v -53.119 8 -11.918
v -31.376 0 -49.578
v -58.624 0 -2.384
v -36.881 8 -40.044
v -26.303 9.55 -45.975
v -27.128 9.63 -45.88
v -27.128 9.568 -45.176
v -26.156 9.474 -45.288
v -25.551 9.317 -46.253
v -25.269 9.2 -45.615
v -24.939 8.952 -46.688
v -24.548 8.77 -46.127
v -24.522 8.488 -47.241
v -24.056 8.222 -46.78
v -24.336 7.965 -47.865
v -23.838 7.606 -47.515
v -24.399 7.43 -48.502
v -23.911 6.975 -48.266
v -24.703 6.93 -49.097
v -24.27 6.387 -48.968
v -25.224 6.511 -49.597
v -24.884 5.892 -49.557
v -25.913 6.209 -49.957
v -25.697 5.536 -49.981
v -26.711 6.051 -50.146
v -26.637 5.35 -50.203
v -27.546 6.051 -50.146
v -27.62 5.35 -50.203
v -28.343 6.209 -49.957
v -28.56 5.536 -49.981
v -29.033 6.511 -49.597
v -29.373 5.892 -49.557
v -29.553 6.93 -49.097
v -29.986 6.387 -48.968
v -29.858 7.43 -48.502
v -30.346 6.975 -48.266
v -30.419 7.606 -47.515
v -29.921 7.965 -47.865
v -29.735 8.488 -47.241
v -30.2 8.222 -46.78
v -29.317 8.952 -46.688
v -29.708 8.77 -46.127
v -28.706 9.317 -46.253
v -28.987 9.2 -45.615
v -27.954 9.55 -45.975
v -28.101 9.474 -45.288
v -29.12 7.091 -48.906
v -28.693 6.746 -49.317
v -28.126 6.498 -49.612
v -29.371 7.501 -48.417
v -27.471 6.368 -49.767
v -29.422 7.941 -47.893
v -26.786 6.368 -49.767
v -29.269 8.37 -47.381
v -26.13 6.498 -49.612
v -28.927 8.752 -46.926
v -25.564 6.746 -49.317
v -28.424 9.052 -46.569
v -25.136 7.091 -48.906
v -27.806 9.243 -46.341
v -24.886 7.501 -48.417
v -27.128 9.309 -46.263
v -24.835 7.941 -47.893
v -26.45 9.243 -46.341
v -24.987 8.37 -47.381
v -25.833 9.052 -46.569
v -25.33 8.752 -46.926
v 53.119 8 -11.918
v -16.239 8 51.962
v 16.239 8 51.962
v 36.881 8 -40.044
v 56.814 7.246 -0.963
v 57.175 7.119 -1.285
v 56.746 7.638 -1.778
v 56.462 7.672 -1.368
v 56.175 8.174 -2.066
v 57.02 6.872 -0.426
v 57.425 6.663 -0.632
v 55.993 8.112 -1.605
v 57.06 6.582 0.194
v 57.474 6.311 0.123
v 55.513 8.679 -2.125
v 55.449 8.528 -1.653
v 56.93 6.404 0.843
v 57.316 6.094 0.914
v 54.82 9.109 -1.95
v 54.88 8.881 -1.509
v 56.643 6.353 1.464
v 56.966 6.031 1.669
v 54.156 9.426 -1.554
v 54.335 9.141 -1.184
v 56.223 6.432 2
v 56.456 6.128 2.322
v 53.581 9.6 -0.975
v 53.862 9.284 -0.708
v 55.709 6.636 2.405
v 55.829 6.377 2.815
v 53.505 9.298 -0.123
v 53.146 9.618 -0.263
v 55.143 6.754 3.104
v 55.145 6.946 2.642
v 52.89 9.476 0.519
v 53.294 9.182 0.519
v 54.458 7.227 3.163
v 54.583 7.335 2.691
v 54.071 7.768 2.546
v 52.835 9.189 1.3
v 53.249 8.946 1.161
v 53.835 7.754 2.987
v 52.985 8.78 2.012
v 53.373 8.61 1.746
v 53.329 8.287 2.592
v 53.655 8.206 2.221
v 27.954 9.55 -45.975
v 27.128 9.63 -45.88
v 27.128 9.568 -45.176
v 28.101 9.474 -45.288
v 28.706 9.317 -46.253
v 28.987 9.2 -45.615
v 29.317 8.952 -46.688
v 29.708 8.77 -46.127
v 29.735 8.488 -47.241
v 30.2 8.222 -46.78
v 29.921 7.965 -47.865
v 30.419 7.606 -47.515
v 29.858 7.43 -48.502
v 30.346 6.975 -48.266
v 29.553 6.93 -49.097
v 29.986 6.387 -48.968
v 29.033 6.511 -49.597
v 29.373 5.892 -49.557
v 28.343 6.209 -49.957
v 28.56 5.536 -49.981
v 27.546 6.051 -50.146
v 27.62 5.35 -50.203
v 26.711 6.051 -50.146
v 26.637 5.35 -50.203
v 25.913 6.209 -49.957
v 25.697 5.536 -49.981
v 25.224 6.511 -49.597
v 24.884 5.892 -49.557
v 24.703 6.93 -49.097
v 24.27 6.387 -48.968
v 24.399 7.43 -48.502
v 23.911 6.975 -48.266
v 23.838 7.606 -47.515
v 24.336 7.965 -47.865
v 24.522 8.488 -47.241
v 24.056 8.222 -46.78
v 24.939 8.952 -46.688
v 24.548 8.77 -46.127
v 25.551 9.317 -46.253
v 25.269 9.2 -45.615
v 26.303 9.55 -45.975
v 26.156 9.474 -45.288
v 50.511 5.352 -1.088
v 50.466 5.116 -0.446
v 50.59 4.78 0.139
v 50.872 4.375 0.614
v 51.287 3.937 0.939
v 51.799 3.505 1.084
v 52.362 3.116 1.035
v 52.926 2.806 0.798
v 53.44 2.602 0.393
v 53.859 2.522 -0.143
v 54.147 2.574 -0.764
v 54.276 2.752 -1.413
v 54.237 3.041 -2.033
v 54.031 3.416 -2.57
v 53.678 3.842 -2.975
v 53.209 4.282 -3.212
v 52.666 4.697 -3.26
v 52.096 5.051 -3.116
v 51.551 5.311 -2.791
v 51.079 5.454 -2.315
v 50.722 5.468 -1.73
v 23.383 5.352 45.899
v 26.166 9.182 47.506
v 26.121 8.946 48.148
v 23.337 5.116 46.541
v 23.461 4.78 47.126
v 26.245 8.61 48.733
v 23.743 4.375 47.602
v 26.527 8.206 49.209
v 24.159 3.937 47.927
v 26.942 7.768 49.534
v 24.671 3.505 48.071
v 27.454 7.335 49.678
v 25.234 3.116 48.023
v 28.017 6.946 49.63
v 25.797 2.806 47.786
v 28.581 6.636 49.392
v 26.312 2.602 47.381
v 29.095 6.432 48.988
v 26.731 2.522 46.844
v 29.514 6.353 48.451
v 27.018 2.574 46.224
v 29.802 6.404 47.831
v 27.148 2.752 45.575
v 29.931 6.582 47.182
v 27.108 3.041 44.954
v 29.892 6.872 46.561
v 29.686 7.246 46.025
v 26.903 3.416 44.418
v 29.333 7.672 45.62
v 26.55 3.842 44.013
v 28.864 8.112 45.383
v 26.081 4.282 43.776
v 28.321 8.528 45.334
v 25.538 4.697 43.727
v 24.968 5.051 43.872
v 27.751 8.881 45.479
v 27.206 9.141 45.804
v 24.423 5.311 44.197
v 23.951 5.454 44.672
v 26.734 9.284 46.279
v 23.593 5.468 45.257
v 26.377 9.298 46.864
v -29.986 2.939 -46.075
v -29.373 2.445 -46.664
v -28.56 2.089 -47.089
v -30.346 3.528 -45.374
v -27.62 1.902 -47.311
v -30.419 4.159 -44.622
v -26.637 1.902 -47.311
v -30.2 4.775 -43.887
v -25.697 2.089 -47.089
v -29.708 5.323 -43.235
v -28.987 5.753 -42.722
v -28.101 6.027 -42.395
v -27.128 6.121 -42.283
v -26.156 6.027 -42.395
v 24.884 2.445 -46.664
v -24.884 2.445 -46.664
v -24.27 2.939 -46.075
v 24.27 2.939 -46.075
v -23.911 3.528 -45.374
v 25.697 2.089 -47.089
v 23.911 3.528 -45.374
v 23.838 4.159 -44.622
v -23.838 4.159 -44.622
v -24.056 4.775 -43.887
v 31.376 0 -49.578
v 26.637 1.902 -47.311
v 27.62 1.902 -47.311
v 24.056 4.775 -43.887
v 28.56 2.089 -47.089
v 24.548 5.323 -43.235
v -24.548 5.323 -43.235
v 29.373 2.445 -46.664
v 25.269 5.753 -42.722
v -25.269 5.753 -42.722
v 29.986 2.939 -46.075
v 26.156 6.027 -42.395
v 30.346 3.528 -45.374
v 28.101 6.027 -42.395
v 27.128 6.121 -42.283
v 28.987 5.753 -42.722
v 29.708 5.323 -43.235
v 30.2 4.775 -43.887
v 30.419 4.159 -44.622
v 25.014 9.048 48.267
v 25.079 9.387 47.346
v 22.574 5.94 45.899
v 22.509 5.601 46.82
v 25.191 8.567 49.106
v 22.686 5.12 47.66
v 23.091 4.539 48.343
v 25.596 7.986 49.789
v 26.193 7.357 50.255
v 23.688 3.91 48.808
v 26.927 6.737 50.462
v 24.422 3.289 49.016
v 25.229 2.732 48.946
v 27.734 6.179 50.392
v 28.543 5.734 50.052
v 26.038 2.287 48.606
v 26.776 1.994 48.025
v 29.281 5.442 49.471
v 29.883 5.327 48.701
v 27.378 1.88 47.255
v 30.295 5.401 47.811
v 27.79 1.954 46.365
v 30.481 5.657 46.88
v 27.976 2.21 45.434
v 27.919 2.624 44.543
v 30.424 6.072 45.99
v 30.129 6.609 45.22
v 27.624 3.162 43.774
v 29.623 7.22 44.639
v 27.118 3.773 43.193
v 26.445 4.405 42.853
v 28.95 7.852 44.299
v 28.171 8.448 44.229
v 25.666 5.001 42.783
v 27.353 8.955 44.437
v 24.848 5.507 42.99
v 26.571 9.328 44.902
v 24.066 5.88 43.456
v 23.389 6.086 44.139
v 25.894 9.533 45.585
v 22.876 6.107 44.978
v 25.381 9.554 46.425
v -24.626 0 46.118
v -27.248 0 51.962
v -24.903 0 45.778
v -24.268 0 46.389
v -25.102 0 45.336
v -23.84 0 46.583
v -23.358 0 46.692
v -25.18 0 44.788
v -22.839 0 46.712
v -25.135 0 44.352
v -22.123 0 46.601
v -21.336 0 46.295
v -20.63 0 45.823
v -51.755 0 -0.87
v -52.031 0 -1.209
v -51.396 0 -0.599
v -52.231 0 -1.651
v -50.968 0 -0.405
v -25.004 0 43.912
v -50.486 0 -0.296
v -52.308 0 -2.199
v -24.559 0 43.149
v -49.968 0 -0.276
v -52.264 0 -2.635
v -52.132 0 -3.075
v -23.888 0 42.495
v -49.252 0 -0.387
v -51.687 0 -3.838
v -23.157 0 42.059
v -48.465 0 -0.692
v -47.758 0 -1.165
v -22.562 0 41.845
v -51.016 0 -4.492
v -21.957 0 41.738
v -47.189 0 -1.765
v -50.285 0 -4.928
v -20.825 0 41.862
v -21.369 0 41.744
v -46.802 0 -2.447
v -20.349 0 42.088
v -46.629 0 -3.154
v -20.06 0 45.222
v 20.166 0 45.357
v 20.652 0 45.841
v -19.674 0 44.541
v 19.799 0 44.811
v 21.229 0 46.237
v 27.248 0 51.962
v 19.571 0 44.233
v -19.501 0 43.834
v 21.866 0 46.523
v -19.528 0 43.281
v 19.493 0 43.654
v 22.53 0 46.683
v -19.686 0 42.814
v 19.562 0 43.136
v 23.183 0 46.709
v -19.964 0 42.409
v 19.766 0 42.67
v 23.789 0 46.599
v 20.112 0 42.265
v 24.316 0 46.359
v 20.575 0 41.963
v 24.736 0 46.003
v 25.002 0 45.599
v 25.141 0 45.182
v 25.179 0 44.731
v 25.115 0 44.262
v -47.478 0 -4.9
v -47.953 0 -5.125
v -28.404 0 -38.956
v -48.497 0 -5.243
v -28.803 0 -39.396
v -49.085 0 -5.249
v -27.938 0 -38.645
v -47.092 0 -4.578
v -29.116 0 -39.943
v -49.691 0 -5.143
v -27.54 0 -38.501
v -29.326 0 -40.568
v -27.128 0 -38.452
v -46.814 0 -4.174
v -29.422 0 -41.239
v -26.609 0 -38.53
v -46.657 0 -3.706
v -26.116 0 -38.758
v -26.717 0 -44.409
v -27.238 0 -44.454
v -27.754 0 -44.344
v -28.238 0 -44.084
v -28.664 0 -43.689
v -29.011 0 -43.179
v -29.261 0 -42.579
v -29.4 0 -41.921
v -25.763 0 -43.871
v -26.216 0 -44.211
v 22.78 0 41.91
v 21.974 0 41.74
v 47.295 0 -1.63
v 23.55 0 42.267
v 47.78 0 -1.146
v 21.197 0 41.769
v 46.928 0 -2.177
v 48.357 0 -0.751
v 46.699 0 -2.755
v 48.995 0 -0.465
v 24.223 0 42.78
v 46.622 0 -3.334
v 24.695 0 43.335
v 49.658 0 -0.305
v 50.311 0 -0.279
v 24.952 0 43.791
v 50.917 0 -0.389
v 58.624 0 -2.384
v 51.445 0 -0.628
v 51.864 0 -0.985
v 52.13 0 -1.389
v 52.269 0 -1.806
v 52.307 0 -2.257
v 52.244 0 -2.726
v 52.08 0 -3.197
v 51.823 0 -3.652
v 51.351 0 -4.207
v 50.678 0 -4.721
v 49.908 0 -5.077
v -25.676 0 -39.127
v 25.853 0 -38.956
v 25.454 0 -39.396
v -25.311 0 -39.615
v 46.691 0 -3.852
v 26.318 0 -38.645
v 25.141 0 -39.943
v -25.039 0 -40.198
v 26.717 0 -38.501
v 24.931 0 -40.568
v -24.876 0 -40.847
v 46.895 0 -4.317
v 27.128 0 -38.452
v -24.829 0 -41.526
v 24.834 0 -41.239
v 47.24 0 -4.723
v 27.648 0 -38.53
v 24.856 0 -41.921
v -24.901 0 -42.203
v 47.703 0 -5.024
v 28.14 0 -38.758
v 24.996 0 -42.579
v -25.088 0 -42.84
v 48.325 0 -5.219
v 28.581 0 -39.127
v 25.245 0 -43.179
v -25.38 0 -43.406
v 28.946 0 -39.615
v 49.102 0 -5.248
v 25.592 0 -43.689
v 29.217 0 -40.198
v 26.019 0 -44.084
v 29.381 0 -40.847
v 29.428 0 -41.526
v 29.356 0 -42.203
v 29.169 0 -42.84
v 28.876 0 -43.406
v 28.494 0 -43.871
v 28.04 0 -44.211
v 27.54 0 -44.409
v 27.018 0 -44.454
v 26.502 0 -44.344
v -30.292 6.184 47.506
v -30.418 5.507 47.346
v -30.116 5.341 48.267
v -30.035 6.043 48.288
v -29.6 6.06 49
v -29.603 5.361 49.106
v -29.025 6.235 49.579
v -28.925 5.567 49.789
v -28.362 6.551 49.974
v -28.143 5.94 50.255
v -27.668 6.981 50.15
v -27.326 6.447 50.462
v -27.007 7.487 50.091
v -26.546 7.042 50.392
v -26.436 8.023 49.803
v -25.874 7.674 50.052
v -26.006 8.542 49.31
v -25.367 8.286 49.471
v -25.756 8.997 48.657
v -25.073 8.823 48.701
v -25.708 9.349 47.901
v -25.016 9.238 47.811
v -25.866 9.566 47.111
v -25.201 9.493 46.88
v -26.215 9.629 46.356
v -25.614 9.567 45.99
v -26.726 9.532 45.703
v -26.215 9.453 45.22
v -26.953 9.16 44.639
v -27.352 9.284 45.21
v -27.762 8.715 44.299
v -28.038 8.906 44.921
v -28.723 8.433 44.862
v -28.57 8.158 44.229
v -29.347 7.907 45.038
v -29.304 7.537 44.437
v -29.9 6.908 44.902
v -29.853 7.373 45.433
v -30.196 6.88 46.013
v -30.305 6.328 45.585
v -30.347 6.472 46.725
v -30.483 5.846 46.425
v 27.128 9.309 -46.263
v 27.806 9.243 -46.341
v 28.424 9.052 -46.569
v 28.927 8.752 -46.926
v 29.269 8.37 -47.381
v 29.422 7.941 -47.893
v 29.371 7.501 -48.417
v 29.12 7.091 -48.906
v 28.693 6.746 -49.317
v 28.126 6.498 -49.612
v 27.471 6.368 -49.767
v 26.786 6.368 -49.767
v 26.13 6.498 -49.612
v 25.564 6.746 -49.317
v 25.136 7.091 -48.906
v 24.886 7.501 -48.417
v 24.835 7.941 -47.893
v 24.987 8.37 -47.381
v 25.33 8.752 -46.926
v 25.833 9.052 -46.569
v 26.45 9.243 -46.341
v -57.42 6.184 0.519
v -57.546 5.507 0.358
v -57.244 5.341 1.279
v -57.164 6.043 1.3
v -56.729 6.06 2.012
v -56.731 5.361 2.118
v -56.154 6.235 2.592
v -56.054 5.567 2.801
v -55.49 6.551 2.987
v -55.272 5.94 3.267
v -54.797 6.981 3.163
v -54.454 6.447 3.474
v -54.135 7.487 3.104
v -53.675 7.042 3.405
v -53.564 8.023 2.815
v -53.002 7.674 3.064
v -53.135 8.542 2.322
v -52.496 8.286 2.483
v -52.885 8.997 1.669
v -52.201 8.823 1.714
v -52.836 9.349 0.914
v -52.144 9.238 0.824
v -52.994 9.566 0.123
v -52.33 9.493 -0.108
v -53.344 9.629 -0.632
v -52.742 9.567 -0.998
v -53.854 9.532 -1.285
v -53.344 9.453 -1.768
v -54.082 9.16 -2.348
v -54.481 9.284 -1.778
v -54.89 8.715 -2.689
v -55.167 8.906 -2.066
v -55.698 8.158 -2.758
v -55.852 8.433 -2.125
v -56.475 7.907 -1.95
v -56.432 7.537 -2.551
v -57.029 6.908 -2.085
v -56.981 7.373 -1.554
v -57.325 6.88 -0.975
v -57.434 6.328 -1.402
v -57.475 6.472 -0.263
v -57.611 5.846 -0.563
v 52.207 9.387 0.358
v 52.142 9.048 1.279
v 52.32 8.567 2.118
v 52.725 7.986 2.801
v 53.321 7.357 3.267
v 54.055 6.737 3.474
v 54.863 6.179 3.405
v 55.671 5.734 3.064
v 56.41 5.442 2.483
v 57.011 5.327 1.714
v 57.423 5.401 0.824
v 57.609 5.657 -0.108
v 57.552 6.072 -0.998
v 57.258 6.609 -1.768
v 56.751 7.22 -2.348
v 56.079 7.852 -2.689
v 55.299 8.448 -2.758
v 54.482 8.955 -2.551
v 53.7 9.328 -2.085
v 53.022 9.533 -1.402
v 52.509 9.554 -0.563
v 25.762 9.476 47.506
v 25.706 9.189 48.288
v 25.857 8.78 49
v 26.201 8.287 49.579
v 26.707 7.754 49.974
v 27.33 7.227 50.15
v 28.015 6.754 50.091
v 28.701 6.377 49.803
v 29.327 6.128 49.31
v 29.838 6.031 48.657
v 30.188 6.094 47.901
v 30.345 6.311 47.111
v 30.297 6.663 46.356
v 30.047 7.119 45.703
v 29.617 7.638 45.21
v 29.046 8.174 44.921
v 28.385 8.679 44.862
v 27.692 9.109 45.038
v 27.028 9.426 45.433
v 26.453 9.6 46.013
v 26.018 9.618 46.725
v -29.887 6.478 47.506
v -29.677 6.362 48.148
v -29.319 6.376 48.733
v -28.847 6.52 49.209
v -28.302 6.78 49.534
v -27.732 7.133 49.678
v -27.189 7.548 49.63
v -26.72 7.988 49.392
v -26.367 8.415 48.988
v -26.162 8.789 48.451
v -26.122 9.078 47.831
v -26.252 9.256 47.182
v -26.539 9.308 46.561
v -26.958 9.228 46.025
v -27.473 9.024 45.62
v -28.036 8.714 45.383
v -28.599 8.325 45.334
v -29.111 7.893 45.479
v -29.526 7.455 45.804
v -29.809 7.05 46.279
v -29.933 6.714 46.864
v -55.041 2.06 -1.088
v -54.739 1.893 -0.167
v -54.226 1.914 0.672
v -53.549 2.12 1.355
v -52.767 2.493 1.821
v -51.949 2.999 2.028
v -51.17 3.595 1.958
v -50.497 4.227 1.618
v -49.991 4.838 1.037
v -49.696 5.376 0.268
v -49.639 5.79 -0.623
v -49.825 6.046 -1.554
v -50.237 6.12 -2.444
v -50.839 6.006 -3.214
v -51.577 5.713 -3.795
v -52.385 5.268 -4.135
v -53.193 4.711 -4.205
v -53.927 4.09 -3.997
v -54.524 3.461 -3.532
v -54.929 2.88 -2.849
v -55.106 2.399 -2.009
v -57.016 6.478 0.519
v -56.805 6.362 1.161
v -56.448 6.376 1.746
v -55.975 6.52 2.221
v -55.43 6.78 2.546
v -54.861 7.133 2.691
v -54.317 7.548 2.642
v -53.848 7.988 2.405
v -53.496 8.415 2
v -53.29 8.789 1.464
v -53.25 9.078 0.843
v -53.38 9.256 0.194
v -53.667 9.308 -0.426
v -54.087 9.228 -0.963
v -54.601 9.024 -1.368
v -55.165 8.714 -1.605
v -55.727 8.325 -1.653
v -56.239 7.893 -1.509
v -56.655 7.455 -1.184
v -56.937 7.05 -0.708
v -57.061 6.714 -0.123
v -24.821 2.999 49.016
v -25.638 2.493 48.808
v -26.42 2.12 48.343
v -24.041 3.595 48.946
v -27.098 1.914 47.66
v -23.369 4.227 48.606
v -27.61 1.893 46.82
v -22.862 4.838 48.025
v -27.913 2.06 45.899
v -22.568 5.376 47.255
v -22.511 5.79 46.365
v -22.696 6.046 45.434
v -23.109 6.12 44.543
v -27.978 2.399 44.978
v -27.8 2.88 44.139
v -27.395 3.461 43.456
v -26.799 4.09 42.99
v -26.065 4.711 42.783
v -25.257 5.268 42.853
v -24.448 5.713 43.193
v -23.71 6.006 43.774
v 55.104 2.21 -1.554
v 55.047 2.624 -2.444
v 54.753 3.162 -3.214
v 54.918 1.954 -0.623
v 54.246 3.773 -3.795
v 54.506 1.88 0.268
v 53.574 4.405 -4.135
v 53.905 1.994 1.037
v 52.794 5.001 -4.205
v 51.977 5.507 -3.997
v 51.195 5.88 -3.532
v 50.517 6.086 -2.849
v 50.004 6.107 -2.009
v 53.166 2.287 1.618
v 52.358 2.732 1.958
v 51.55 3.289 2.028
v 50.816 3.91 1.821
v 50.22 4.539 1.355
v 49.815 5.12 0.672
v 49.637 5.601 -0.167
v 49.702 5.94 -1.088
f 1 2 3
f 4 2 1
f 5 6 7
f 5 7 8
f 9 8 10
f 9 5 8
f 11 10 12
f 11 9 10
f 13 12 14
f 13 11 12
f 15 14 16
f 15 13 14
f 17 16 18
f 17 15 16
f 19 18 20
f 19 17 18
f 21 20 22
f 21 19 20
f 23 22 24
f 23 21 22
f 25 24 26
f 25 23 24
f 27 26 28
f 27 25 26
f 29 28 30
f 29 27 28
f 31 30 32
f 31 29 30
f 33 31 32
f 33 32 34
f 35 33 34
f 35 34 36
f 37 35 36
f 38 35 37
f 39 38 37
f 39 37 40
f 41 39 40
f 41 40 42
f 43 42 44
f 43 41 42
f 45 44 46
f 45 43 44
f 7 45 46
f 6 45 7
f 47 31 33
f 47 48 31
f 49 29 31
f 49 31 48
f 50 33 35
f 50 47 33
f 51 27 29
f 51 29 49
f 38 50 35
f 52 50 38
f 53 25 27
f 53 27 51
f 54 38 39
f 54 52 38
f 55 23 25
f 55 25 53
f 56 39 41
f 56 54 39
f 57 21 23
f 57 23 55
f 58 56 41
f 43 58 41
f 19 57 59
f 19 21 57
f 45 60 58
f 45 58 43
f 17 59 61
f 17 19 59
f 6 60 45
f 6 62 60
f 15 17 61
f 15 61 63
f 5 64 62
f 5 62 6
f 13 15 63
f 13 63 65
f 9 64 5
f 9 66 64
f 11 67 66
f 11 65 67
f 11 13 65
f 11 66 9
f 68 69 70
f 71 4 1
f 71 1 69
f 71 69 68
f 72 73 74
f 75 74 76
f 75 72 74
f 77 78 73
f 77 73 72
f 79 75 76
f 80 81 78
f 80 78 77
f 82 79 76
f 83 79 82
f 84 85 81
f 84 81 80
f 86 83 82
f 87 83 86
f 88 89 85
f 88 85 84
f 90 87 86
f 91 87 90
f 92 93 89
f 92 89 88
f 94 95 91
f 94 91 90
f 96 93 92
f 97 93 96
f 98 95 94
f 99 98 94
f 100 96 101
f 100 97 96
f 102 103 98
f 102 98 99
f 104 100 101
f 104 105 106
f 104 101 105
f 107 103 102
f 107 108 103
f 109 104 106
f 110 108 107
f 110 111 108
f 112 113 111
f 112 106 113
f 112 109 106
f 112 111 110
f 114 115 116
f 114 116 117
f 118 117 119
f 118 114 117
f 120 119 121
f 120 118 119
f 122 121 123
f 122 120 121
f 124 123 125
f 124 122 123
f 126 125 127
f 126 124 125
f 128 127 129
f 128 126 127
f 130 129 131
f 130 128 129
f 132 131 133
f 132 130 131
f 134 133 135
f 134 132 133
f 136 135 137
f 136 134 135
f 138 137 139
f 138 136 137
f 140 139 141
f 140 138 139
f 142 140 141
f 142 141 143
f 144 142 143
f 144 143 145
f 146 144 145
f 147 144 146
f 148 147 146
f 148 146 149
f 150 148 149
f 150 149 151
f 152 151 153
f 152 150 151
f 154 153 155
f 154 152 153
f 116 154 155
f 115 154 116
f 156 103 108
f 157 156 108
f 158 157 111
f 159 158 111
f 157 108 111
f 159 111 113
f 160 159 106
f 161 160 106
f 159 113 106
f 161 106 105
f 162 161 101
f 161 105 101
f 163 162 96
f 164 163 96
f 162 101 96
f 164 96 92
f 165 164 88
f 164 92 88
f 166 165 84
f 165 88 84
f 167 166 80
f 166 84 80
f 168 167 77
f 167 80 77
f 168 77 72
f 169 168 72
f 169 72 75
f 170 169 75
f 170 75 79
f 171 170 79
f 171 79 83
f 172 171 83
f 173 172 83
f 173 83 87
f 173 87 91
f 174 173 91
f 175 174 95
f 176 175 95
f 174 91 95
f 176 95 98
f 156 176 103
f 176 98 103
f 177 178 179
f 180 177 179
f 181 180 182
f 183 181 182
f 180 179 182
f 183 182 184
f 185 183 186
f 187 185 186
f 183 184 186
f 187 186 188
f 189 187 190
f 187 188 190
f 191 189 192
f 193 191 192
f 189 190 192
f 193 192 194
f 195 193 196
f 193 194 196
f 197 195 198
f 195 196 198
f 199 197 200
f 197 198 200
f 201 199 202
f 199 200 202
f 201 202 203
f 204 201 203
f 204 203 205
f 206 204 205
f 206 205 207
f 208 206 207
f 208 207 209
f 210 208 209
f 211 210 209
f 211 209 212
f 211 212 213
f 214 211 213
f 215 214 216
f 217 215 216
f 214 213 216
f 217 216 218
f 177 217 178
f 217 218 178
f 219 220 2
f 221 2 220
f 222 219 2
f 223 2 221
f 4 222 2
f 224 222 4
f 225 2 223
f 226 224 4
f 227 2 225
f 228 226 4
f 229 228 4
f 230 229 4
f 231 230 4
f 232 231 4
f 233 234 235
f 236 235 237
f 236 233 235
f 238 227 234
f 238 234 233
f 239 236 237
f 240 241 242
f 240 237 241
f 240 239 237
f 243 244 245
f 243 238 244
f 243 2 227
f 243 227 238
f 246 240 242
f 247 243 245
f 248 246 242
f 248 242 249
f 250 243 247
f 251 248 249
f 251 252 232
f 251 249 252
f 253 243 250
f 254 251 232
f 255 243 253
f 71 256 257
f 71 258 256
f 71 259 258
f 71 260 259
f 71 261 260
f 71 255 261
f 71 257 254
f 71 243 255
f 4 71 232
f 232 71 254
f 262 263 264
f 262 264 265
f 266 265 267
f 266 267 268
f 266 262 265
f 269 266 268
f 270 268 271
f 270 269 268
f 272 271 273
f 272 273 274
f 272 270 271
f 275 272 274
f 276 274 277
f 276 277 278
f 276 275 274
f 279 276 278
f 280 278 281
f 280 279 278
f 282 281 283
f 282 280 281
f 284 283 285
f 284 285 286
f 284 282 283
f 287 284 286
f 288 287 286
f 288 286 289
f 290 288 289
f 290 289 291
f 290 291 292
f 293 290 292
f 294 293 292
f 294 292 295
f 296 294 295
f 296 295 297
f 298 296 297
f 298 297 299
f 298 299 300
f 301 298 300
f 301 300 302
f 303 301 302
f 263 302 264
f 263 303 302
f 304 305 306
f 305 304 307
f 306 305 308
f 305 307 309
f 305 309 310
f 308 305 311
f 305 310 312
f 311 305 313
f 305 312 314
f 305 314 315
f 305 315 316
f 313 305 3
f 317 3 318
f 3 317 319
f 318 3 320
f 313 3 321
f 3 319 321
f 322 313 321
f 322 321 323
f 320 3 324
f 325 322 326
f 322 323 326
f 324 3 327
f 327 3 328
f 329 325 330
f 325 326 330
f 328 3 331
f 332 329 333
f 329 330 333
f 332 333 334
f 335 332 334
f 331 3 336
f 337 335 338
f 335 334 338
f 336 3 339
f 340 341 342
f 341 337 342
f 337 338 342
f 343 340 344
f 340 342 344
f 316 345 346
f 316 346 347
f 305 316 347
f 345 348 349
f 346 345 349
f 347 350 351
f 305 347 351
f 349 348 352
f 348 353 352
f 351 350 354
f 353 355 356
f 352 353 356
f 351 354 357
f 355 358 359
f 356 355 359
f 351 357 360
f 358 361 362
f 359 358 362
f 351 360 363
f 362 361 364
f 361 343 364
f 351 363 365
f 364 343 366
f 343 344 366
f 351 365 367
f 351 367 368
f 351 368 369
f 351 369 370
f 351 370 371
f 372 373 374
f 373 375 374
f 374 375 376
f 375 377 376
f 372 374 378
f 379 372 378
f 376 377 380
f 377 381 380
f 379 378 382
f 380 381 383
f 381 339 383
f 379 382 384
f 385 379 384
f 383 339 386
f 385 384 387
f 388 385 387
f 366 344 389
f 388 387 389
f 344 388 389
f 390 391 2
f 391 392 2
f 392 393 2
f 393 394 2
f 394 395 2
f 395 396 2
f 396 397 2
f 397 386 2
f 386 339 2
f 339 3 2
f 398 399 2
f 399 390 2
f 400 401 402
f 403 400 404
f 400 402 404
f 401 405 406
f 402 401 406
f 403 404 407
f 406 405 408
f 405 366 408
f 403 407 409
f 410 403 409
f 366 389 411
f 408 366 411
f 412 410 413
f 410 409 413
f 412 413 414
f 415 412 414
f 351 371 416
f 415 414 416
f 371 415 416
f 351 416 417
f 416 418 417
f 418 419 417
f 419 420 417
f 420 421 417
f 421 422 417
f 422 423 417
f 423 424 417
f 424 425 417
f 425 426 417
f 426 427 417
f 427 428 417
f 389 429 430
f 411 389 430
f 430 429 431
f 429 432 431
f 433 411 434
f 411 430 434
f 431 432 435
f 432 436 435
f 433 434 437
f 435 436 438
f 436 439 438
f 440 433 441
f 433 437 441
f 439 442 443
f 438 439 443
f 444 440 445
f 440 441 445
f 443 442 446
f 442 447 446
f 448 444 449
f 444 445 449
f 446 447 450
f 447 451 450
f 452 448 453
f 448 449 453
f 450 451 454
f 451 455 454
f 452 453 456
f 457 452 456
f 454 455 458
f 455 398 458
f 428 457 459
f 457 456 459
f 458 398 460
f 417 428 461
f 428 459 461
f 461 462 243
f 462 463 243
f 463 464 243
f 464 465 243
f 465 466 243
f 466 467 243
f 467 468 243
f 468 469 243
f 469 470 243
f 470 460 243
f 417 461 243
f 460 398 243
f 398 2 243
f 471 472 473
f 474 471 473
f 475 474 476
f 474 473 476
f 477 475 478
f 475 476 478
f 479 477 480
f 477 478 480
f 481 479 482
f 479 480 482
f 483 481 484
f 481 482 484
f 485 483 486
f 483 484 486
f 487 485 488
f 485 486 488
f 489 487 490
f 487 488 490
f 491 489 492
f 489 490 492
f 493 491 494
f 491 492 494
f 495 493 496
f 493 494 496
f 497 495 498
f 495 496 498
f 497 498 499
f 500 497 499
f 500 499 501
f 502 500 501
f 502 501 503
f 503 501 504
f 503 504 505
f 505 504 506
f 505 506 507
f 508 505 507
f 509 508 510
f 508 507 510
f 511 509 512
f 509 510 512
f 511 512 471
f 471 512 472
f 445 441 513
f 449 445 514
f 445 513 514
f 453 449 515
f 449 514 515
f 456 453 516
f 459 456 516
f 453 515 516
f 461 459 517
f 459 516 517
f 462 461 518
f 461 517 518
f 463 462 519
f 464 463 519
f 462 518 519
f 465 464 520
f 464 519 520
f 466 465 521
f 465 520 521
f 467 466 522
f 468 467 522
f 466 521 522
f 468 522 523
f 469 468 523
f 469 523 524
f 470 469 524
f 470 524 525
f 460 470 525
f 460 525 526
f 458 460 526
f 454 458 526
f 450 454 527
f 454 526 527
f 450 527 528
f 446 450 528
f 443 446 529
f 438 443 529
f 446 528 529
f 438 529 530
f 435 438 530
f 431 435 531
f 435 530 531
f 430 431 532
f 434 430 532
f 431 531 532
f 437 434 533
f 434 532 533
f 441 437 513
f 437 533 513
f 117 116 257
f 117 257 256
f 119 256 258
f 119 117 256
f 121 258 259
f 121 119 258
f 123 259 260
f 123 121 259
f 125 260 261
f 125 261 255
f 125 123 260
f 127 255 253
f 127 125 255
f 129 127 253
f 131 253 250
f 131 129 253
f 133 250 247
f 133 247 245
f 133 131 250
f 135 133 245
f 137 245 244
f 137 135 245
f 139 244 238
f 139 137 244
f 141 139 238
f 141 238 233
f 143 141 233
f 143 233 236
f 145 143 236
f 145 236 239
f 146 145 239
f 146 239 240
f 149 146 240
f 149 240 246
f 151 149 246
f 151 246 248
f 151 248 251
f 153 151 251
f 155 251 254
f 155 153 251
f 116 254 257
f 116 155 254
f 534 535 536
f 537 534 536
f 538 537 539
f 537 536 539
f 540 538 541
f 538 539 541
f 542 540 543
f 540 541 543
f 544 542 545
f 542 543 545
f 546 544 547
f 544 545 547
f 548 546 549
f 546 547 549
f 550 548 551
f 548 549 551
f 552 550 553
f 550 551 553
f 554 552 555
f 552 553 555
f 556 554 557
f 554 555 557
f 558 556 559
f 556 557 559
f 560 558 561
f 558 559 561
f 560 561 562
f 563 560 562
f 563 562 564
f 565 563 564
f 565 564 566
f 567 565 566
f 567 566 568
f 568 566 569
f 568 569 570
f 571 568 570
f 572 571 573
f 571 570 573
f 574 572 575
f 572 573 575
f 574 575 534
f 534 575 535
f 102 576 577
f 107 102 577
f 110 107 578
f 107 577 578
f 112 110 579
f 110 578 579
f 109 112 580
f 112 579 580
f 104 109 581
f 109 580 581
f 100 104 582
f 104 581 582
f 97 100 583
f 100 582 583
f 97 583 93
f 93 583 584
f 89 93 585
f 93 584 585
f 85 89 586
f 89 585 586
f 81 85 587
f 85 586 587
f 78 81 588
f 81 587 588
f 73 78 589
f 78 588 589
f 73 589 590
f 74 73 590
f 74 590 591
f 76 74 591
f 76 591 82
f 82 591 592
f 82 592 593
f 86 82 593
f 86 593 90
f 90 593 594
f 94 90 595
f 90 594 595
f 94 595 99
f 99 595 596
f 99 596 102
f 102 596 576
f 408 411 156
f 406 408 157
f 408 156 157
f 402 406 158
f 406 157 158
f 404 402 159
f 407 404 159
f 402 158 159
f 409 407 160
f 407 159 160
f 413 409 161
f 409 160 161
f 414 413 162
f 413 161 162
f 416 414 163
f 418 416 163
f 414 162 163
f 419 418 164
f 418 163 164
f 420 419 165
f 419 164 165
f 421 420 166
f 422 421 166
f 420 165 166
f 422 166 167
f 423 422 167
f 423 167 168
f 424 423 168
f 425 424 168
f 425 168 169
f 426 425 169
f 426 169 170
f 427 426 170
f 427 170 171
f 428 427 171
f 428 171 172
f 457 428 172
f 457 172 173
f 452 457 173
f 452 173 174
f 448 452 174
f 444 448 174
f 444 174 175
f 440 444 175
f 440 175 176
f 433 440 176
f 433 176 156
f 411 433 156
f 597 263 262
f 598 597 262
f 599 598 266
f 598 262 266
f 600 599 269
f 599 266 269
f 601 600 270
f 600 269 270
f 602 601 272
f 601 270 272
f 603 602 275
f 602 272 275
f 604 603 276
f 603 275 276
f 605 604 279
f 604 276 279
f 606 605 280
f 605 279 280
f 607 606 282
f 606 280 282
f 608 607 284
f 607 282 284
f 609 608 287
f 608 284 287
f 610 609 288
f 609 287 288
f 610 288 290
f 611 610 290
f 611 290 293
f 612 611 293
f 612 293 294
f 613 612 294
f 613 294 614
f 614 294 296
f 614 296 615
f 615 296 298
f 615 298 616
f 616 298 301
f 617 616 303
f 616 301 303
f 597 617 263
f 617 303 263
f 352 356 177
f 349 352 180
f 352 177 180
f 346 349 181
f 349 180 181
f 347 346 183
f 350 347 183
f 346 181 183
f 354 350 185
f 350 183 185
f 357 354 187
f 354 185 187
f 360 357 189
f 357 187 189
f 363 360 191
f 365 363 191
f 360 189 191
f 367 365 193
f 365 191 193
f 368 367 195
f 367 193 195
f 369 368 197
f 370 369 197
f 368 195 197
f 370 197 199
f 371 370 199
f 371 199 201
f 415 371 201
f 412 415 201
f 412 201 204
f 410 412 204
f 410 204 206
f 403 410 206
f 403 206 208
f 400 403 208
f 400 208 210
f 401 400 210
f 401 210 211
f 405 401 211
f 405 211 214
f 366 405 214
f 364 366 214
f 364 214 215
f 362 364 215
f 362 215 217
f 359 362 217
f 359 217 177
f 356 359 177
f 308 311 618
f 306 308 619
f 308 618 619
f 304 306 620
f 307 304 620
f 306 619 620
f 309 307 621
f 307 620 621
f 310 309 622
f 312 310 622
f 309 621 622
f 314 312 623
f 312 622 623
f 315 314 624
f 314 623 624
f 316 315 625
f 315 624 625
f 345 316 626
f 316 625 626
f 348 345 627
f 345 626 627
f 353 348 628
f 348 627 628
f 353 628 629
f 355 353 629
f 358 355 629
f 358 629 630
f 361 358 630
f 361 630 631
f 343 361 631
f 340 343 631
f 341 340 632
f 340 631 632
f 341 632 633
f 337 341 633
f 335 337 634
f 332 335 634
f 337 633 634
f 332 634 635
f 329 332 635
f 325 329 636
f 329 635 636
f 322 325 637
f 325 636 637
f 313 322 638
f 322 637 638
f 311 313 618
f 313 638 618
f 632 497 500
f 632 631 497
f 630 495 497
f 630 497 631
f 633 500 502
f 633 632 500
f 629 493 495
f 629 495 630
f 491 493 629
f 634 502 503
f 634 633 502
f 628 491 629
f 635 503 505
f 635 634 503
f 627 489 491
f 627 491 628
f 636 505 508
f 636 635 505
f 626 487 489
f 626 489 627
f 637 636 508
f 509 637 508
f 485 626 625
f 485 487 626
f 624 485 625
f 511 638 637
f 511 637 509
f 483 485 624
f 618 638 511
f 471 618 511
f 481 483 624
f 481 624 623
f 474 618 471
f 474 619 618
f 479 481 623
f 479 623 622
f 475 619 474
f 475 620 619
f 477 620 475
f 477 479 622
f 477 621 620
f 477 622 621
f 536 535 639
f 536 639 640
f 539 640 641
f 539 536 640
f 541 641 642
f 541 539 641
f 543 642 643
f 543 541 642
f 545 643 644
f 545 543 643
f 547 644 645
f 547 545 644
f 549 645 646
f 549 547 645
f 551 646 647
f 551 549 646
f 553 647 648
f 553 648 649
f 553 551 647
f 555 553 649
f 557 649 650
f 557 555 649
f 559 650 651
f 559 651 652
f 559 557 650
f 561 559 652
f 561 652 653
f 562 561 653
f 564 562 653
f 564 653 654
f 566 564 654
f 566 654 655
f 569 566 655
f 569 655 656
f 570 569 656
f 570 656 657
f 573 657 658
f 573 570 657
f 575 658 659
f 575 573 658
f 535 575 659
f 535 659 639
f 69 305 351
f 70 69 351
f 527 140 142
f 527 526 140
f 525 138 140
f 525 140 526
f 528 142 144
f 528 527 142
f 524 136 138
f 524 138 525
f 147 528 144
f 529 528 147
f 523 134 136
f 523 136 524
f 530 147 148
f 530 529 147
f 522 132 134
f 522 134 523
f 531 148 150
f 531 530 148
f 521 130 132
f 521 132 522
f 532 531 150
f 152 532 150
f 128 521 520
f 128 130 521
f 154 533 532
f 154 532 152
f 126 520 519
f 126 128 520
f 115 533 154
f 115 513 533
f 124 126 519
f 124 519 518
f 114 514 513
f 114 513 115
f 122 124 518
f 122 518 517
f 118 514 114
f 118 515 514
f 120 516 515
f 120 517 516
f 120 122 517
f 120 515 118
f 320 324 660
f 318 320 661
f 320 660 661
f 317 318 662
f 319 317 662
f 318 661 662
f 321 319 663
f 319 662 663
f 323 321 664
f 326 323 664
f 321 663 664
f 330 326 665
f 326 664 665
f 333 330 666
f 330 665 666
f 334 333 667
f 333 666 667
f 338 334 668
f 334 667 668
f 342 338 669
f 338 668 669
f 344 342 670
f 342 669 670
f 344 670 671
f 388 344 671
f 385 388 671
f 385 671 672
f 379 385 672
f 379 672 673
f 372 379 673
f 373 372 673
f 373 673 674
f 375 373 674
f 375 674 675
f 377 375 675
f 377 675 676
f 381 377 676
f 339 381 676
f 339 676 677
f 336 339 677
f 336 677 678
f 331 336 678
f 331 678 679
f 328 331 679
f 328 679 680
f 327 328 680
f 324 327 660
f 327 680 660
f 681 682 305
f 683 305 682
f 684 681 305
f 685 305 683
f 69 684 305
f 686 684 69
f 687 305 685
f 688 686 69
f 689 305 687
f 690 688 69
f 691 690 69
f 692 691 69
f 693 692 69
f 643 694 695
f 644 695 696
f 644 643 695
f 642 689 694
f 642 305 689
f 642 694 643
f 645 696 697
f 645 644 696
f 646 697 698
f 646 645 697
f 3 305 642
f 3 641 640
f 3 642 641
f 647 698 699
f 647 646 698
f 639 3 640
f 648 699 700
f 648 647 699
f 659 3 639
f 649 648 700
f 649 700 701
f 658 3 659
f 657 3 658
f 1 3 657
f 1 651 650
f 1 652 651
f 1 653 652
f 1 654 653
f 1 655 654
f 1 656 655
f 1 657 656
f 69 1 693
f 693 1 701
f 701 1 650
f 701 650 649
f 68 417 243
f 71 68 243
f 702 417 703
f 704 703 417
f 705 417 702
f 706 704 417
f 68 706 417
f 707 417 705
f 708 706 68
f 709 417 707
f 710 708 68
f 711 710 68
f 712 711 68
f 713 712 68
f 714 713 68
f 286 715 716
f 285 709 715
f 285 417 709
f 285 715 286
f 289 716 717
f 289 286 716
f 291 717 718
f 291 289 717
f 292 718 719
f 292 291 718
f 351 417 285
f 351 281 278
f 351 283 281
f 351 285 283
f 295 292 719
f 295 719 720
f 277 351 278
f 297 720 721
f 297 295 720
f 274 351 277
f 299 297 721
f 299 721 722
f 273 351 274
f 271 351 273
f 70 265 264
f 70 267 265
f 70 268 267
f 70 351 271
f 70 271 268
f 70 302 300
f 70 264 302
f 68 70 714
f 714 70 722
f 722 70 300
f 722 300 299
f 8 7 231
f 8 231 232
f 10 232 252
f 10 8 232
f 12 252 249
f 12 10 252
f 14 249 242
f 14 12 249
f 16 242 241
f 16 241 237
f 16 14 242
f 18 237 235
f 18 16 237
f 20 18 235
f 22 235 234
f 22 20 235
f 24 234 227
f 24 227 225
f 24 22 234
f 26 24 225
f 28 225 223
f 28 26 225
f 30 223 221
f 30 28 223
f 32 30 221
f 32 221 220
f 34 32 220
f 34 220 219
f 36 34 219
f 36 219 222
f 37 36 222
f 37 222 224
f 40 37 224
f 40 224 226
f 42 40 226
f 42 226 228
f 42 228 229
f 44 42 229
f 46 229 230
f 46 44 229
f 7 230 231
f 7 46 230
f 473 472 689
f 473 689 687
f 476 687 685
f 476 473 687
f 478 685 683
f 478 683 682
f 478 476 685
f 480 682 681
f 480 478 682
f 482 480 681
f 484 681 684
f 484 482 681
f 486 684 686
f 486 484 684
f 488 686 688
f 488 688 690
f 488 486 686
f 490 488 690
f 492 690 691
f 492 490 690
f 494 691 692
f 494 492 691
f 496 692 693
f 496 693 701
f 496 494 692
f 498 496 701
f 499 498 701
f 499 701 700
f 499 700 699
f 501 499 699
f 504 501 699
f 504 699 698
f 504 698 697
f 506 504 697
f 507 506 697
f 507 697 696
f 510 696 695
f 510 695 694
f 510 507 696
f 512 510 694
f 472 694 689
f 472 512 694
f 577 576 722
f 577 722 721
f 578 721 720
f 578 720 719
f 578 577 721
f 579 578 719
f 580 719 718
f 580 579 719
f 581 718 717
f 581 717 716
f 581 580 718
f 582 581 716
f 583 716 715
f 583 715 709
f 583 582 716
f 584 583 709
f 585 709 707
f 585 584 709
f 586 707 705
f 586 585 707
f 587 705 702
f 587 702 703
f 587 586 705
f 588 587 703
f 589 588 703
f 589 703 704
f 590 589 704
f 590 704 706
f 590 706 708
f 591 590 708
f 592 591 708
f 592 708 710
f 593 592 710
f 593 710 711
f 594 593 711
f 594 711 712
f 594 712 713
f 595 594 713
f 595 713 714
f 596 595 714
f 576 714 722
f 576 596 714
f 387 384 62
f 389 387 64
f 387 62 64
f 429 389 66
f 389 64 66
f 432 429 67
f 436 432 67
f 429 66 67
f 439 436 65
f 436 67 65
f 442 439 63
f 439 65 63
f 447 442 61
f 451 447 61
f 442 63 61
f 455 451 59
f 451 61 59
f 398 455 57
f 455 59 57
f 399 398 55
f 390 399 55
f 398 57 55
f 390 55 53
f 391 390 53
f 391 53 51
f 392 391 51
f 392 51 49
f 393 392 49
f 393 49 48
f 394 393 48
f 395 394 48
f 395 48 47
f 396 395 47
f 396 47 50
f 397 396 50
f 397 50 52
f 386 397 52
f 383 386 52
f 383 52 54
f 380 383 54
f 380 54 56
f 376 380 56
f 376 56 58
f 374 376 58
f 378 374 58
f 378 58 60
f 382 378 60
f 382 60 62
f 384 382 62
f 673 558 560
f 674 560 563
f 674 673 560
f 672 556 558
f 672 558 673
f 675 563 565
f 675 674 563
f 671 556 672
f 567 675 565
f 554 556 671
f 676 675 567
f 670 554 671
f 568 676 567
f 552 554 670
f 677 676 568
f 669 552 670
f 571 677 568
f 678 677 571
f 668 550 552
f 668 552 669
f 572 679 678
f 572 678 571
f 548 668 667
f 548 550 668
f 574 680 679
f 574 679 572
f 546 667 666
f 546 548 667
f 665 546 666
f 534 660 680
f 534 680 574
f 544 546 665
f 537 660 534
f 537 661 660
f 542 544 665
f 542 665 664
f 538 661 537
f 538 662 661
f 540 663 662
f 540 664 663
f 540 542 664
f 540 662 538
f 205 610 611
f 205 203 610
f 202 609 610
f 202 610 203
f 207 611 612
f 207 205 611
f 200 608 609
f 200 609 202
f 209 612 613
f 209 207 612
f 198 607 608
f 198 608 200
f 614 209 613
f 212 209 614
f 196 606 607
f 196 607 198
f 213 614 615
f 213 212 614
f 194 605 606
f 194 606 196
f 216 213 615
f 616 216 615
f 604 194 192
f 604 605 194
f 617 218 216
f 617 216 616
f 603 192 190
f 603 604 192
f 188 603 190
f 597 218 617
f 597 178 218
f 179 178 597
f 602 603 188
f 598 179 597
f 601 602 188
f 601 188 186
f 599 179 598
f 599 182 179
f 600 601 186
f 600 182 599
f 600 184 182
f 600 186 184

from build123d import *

# Parameters (mm, degrees)
BOSS_EXTRUDE1_DEPTH = 8
CHAMFER1_SIZE       = 10
CHAMFER1_SIZE_2     = 11.917535926
SKETCH4_R           = 2.3
CUT_EXTRUDE1_DEPTH  = 101.029376687
SKETCH7_R           = 2.3
CUT_EXTRUDE2_DEPTH  = 97.338690096
SKETCH6_R           = 2.3
CUT_EXTRUDE3_DEPTH  = 101.029376687
BOSS_EXTRUDE2_START = 5
SKETCH8_R           = 3.3
SKETCH8_R_2         = 2.3
BOSS_EXTRUDE2_DEPTH = 5
BOSS_EXTRUDE3_START = 5
SKETCH9_R           = 3.3
SKETCH9_R_2         = 2.3
BOSS_EXTRUDE3_DEPTH = 5
BOSS_EXTRUDE4_START = 5
SKETCH10_R          = 3.3
SKETCH10_R_2        = 2.3
BOSS_EXTRUDE4_DEPTH = 5
CHAMFER2_SIZE       = 0.5


with BuildPart() as part:
    # Sketch1 → Boss-Extrude1 (new body)
    with BuildSketch(Plane(origin=(0, 0, 0), x_dir=(1, 0, 0), z_dir=(0, 1, 0))):
        Polygon((-60, 0), (-30, -51.961524227), (30, -51.961524227), (60, 0), (30, 51.961524227), (-30, 51.961524227), align=None)
    extrude(amount=BOSS_EXTRUDE1_DEPTH)

    # Chamfer1
    # the kernel refuses this chamfer: 11.917535926, 10 mm, written as the material it takes off along each edge
    with BuildSketch(Plane(origin=(60.716329832, 8, -51.961524227), x_dir=(0, -0.9993728857116146, -0.0354095369136628), z_dir=(-1, 0, 0)), Plane(origin=(-75.358164916, 8, -26.601121946), x_dir=(-0.030665558503474466, -0.9993728857116146, 0.017704768456831187), z_dir=(0.4999999999999998, 0, 0.8660254037844388)), Plane(origin=(14.641835084, 8, 78.562646173), x_dir=(0.03066555850347504, -0.9993728857116146, 0.017704768456831523), z_dir=(0.4999999999999999, 0, -0.8660254037844388))) as chamfer1_piece_1:
        Polygon((CHAMFER1_SIZE * 0.999372885712, CHAMFER1_SIZE * 0.0354095369137), (-CHAMFER1_SIZE_2 * 0.0354095369135, CHAMFER1_SIZE_2 * 0.999372885707), (0, 0), align=None)
    extrude(amount=121.432659665, mode=Mode.SUBTRACT)

    # Sketch4 → Cut-Extrude1 (cut, through all)
    with BuildSketch(Plane(origin=(17.740047471, 24.412407781, 10.242221183), x_dir=(0.8301060005968417, -0.4979011414928852, -0.2510348204397117), z_dir=(0.5566703992264165, 0.766044443118981, 0.3213938048432679))):
        with Locations(Location((41.75562393, 0.929232239, 0), (0, 0, 164.627134315))):
            Circle(SKETCH4_R)
        with Locations(Location((7.440666851, -41.097835456, 0), (0, 0, 164.627134315))):
            Circle(SKETCH4_R)
    extrude(amount=-CUT_EXTRUDE1_DEPTH, mode=Mode.SUBTRACT)

    # Sketch7 → Cut-Extrude2 (cut, through all)
    with BuildSketch(Plane(origin=(0, 24.412407781, -20.484442365), x_dir=(1, 0, 0), z_dir=(0, 0.7660444431189811, -0.6427876096865357))):
        with Locations(Location((-27.128355545, 31.756069148, 0), (0, 0, 270))):
            Circle(SKETCH7_R)
        with Locations(Location((27.128355545, 31.756069148, 0), (0, 0, 270))):
            Circle(SKETCH7_R)
    extrude(amount=-CUT_EXTRUDE2_DEPTH, mode=Mode.SUBTRACT)

    # Sketch6 → Cut-Extrude3 (cut, through all)
    with BuildSketch(Plane(origin=(-17.740047471, 24.412407781, 10.242221183), x_dir=(0.8307334510088673, 0.5133226132381532, 0.21536440772154375), z_dir=(-0.5566703992264166, 0.766044443118981, 0.3213938048432678))):
        with Locations(Location((-41.687976983, 2.551112975, 0), (0, 0, 193.145847187))):
            Circle(SKETCH6_R)
        with Locations(Location((-9.032068506, -40.777657373, 0), (0, 0, 193.145847187))):
            Circle(SKETCH6_R)
    extrude(amount=-CUT_EXTRUDE3_DEPTH, mode=Mode.SUBTRACT)

    # Sketch8 → Boss-Extrude2 (add)
    # profile 1 of 2: a face of its own
    with BuildSketch(Plane(origin=(17.740047471, 24.412407781, 10.242221183), x_dir=(0.8307334510088674, -0.5133226132381531, -0.21536440772154372), z_dir=(0.5566703992264164, 0.766044443118981, 0.32139380484326796)).offset(BOSS_EXTRUDE2_START)):
        with Locations(Location((9.032068506, -40.777657373, 0), (0, 0, 166.854152813))):
            Circle(SKETCH8_R)
        with Locations(Location((9.032068506, -40.777657373, 0), (0, 0, 166.854152813))):
            Circle(SKETCH8_R_2, mode=Mode.SUBTRACT)
    # profile 2 of 2: a face of its own
    with BuildSketch(Plane(origin=(17.740047471, 24.412407781, 10.242221183), x_dir=(0.8307334510088674, -0.5133226132381531, -0.21536440772154372), z_dir=(0.5566703992264164, 0.766044443118981, 0.32139380484326796)).offset(BOSS_EXTRUDE2_START)):
        with Locations(Location((41.687976983, 2.551112975, 0), (0, 0, 166.854152813))):
            Circle(SKETCH8_R)
        with Locations(Location((41.687976983, 2.551112975, 0), (0, 0, 166.854152813))):
            Circle(SKETCH8_R_2, mode=Mode.SUBTRACT)
    extrude(amount=-BOSS_EXTRUDE2_DEPTH)

    # Sketch9 → Boss-Extrude3 (add)
    # profile 1 of 2: a face of its own
    with BuildSketch(Plane(origin=(-17.740047471, 24.412407781, 10.242221183), x_dir=(0.8307334510088673, 0.5133226132381532, 0.21536440772154375), z_dir=(-0.5566703992264166, 0.766044443118981, 0.3213938048432678)).offset(BOSS_EXTRUDE3_START)):
        with Locations(Location((-41.687976983, 2.551112975, 0), (0, 0, 193.145847187))):
            Circle(SKETCH9_R)
        with Locations(Location((-41.687976983, 2.551112975, 0), (0, 0, 193.145847187))):
            Circle(SKETCH9_R_2, mode=Mode.SUBTRACT)
    # profile 2 of 2: a face of its own
    with BuildSketch(Plane(origin=(-17.740047471, 24.412407781, 10.242221183), x_dir=(0.8307334510088673, 0.5133226132381532, 0.21536440772154375), z_dir=(-0.5566703992264166, 0.766044443118981, 0.3213938048432678)).offset(BOSS_EXTRUDE3_START)):
        with Locations(Location((-9.032068506, -40.777657373, 0), (0, 0, 193.145847187))):
            Circle(SKETCH9_R)
        with Locations(Location((-9.032068506, -40.777657373, 0), (0, 0, 193.145847187))):
            Circle(SKETCH9_R_2, mode=Mode.SUBTRACT)
    extrude(amount=-BOSS_EXTRUDE3_DEPTH)

    # Sketch10 → Boss-Extrude4 (add)
    # profile 1 of 2: a face of its own
    with BuildSketch(Plane(origin=(0, 24.412407781, -20.484442365), x_dir=(1, 0, 0), z_dir=(0, 0.7660444431189811, -0.6427876096865357)).offset(BOSS_EXTRUDE4_START)):
        with Locations(Location((-27.128355545, 31.756069148, 0), (0, 0, 270))):
            Circle(SKETCH10_R)
        with Locations(Location((-27.128355545, 31.756069148, 0), (0, 0, 270))):
            Circle(SKETCH10_R_2, mode=Mode.SUBTRACT)
    # profile 2 of 2: a face of its own
    with BuildSketch(Plane(origin=(0, 24.412407781, -20.484442365), x_dir=(1, 0, 0), z_dir=(0, 0.7660444431189811, -0.6427876096865357)).offset(BOSS_EXTRUDE4_START)):
        with Locations(Location((27.128355545, 31.756069148, 0), (0, 0, 270))):
            Circle(SKETCH10_R)
        with Locations(Location((27.128355545, 31.756069148, 0), (0, 0, 270))):
            Circle(SKETCH10_R_2, mode=Mode.SUBTRACT)
    extrude(amount=-BOSS_EXTRUDE4_DEPTH)

    # Chamfer2
    chamfer2_edges = [part.edges().sort_by_distance(p)[0] for p in [
        (27.128355545, 5.709023104, -50.552887382),
        (30.696220434, 5.890287901, 47.506315425),
        (57.824575979, 5.890287901, 0.518625295),
        (-52.485416923, 9.77015653, 0.518625295),
        (-25.357061378, 9.77015653, 47.506315425),
        (-27.128355545, 5.709023104, -50.552887382),
    ]]
    chamfer(chamfer2_edges, length=CHAMFER2_SIZE)


solid = part.part
